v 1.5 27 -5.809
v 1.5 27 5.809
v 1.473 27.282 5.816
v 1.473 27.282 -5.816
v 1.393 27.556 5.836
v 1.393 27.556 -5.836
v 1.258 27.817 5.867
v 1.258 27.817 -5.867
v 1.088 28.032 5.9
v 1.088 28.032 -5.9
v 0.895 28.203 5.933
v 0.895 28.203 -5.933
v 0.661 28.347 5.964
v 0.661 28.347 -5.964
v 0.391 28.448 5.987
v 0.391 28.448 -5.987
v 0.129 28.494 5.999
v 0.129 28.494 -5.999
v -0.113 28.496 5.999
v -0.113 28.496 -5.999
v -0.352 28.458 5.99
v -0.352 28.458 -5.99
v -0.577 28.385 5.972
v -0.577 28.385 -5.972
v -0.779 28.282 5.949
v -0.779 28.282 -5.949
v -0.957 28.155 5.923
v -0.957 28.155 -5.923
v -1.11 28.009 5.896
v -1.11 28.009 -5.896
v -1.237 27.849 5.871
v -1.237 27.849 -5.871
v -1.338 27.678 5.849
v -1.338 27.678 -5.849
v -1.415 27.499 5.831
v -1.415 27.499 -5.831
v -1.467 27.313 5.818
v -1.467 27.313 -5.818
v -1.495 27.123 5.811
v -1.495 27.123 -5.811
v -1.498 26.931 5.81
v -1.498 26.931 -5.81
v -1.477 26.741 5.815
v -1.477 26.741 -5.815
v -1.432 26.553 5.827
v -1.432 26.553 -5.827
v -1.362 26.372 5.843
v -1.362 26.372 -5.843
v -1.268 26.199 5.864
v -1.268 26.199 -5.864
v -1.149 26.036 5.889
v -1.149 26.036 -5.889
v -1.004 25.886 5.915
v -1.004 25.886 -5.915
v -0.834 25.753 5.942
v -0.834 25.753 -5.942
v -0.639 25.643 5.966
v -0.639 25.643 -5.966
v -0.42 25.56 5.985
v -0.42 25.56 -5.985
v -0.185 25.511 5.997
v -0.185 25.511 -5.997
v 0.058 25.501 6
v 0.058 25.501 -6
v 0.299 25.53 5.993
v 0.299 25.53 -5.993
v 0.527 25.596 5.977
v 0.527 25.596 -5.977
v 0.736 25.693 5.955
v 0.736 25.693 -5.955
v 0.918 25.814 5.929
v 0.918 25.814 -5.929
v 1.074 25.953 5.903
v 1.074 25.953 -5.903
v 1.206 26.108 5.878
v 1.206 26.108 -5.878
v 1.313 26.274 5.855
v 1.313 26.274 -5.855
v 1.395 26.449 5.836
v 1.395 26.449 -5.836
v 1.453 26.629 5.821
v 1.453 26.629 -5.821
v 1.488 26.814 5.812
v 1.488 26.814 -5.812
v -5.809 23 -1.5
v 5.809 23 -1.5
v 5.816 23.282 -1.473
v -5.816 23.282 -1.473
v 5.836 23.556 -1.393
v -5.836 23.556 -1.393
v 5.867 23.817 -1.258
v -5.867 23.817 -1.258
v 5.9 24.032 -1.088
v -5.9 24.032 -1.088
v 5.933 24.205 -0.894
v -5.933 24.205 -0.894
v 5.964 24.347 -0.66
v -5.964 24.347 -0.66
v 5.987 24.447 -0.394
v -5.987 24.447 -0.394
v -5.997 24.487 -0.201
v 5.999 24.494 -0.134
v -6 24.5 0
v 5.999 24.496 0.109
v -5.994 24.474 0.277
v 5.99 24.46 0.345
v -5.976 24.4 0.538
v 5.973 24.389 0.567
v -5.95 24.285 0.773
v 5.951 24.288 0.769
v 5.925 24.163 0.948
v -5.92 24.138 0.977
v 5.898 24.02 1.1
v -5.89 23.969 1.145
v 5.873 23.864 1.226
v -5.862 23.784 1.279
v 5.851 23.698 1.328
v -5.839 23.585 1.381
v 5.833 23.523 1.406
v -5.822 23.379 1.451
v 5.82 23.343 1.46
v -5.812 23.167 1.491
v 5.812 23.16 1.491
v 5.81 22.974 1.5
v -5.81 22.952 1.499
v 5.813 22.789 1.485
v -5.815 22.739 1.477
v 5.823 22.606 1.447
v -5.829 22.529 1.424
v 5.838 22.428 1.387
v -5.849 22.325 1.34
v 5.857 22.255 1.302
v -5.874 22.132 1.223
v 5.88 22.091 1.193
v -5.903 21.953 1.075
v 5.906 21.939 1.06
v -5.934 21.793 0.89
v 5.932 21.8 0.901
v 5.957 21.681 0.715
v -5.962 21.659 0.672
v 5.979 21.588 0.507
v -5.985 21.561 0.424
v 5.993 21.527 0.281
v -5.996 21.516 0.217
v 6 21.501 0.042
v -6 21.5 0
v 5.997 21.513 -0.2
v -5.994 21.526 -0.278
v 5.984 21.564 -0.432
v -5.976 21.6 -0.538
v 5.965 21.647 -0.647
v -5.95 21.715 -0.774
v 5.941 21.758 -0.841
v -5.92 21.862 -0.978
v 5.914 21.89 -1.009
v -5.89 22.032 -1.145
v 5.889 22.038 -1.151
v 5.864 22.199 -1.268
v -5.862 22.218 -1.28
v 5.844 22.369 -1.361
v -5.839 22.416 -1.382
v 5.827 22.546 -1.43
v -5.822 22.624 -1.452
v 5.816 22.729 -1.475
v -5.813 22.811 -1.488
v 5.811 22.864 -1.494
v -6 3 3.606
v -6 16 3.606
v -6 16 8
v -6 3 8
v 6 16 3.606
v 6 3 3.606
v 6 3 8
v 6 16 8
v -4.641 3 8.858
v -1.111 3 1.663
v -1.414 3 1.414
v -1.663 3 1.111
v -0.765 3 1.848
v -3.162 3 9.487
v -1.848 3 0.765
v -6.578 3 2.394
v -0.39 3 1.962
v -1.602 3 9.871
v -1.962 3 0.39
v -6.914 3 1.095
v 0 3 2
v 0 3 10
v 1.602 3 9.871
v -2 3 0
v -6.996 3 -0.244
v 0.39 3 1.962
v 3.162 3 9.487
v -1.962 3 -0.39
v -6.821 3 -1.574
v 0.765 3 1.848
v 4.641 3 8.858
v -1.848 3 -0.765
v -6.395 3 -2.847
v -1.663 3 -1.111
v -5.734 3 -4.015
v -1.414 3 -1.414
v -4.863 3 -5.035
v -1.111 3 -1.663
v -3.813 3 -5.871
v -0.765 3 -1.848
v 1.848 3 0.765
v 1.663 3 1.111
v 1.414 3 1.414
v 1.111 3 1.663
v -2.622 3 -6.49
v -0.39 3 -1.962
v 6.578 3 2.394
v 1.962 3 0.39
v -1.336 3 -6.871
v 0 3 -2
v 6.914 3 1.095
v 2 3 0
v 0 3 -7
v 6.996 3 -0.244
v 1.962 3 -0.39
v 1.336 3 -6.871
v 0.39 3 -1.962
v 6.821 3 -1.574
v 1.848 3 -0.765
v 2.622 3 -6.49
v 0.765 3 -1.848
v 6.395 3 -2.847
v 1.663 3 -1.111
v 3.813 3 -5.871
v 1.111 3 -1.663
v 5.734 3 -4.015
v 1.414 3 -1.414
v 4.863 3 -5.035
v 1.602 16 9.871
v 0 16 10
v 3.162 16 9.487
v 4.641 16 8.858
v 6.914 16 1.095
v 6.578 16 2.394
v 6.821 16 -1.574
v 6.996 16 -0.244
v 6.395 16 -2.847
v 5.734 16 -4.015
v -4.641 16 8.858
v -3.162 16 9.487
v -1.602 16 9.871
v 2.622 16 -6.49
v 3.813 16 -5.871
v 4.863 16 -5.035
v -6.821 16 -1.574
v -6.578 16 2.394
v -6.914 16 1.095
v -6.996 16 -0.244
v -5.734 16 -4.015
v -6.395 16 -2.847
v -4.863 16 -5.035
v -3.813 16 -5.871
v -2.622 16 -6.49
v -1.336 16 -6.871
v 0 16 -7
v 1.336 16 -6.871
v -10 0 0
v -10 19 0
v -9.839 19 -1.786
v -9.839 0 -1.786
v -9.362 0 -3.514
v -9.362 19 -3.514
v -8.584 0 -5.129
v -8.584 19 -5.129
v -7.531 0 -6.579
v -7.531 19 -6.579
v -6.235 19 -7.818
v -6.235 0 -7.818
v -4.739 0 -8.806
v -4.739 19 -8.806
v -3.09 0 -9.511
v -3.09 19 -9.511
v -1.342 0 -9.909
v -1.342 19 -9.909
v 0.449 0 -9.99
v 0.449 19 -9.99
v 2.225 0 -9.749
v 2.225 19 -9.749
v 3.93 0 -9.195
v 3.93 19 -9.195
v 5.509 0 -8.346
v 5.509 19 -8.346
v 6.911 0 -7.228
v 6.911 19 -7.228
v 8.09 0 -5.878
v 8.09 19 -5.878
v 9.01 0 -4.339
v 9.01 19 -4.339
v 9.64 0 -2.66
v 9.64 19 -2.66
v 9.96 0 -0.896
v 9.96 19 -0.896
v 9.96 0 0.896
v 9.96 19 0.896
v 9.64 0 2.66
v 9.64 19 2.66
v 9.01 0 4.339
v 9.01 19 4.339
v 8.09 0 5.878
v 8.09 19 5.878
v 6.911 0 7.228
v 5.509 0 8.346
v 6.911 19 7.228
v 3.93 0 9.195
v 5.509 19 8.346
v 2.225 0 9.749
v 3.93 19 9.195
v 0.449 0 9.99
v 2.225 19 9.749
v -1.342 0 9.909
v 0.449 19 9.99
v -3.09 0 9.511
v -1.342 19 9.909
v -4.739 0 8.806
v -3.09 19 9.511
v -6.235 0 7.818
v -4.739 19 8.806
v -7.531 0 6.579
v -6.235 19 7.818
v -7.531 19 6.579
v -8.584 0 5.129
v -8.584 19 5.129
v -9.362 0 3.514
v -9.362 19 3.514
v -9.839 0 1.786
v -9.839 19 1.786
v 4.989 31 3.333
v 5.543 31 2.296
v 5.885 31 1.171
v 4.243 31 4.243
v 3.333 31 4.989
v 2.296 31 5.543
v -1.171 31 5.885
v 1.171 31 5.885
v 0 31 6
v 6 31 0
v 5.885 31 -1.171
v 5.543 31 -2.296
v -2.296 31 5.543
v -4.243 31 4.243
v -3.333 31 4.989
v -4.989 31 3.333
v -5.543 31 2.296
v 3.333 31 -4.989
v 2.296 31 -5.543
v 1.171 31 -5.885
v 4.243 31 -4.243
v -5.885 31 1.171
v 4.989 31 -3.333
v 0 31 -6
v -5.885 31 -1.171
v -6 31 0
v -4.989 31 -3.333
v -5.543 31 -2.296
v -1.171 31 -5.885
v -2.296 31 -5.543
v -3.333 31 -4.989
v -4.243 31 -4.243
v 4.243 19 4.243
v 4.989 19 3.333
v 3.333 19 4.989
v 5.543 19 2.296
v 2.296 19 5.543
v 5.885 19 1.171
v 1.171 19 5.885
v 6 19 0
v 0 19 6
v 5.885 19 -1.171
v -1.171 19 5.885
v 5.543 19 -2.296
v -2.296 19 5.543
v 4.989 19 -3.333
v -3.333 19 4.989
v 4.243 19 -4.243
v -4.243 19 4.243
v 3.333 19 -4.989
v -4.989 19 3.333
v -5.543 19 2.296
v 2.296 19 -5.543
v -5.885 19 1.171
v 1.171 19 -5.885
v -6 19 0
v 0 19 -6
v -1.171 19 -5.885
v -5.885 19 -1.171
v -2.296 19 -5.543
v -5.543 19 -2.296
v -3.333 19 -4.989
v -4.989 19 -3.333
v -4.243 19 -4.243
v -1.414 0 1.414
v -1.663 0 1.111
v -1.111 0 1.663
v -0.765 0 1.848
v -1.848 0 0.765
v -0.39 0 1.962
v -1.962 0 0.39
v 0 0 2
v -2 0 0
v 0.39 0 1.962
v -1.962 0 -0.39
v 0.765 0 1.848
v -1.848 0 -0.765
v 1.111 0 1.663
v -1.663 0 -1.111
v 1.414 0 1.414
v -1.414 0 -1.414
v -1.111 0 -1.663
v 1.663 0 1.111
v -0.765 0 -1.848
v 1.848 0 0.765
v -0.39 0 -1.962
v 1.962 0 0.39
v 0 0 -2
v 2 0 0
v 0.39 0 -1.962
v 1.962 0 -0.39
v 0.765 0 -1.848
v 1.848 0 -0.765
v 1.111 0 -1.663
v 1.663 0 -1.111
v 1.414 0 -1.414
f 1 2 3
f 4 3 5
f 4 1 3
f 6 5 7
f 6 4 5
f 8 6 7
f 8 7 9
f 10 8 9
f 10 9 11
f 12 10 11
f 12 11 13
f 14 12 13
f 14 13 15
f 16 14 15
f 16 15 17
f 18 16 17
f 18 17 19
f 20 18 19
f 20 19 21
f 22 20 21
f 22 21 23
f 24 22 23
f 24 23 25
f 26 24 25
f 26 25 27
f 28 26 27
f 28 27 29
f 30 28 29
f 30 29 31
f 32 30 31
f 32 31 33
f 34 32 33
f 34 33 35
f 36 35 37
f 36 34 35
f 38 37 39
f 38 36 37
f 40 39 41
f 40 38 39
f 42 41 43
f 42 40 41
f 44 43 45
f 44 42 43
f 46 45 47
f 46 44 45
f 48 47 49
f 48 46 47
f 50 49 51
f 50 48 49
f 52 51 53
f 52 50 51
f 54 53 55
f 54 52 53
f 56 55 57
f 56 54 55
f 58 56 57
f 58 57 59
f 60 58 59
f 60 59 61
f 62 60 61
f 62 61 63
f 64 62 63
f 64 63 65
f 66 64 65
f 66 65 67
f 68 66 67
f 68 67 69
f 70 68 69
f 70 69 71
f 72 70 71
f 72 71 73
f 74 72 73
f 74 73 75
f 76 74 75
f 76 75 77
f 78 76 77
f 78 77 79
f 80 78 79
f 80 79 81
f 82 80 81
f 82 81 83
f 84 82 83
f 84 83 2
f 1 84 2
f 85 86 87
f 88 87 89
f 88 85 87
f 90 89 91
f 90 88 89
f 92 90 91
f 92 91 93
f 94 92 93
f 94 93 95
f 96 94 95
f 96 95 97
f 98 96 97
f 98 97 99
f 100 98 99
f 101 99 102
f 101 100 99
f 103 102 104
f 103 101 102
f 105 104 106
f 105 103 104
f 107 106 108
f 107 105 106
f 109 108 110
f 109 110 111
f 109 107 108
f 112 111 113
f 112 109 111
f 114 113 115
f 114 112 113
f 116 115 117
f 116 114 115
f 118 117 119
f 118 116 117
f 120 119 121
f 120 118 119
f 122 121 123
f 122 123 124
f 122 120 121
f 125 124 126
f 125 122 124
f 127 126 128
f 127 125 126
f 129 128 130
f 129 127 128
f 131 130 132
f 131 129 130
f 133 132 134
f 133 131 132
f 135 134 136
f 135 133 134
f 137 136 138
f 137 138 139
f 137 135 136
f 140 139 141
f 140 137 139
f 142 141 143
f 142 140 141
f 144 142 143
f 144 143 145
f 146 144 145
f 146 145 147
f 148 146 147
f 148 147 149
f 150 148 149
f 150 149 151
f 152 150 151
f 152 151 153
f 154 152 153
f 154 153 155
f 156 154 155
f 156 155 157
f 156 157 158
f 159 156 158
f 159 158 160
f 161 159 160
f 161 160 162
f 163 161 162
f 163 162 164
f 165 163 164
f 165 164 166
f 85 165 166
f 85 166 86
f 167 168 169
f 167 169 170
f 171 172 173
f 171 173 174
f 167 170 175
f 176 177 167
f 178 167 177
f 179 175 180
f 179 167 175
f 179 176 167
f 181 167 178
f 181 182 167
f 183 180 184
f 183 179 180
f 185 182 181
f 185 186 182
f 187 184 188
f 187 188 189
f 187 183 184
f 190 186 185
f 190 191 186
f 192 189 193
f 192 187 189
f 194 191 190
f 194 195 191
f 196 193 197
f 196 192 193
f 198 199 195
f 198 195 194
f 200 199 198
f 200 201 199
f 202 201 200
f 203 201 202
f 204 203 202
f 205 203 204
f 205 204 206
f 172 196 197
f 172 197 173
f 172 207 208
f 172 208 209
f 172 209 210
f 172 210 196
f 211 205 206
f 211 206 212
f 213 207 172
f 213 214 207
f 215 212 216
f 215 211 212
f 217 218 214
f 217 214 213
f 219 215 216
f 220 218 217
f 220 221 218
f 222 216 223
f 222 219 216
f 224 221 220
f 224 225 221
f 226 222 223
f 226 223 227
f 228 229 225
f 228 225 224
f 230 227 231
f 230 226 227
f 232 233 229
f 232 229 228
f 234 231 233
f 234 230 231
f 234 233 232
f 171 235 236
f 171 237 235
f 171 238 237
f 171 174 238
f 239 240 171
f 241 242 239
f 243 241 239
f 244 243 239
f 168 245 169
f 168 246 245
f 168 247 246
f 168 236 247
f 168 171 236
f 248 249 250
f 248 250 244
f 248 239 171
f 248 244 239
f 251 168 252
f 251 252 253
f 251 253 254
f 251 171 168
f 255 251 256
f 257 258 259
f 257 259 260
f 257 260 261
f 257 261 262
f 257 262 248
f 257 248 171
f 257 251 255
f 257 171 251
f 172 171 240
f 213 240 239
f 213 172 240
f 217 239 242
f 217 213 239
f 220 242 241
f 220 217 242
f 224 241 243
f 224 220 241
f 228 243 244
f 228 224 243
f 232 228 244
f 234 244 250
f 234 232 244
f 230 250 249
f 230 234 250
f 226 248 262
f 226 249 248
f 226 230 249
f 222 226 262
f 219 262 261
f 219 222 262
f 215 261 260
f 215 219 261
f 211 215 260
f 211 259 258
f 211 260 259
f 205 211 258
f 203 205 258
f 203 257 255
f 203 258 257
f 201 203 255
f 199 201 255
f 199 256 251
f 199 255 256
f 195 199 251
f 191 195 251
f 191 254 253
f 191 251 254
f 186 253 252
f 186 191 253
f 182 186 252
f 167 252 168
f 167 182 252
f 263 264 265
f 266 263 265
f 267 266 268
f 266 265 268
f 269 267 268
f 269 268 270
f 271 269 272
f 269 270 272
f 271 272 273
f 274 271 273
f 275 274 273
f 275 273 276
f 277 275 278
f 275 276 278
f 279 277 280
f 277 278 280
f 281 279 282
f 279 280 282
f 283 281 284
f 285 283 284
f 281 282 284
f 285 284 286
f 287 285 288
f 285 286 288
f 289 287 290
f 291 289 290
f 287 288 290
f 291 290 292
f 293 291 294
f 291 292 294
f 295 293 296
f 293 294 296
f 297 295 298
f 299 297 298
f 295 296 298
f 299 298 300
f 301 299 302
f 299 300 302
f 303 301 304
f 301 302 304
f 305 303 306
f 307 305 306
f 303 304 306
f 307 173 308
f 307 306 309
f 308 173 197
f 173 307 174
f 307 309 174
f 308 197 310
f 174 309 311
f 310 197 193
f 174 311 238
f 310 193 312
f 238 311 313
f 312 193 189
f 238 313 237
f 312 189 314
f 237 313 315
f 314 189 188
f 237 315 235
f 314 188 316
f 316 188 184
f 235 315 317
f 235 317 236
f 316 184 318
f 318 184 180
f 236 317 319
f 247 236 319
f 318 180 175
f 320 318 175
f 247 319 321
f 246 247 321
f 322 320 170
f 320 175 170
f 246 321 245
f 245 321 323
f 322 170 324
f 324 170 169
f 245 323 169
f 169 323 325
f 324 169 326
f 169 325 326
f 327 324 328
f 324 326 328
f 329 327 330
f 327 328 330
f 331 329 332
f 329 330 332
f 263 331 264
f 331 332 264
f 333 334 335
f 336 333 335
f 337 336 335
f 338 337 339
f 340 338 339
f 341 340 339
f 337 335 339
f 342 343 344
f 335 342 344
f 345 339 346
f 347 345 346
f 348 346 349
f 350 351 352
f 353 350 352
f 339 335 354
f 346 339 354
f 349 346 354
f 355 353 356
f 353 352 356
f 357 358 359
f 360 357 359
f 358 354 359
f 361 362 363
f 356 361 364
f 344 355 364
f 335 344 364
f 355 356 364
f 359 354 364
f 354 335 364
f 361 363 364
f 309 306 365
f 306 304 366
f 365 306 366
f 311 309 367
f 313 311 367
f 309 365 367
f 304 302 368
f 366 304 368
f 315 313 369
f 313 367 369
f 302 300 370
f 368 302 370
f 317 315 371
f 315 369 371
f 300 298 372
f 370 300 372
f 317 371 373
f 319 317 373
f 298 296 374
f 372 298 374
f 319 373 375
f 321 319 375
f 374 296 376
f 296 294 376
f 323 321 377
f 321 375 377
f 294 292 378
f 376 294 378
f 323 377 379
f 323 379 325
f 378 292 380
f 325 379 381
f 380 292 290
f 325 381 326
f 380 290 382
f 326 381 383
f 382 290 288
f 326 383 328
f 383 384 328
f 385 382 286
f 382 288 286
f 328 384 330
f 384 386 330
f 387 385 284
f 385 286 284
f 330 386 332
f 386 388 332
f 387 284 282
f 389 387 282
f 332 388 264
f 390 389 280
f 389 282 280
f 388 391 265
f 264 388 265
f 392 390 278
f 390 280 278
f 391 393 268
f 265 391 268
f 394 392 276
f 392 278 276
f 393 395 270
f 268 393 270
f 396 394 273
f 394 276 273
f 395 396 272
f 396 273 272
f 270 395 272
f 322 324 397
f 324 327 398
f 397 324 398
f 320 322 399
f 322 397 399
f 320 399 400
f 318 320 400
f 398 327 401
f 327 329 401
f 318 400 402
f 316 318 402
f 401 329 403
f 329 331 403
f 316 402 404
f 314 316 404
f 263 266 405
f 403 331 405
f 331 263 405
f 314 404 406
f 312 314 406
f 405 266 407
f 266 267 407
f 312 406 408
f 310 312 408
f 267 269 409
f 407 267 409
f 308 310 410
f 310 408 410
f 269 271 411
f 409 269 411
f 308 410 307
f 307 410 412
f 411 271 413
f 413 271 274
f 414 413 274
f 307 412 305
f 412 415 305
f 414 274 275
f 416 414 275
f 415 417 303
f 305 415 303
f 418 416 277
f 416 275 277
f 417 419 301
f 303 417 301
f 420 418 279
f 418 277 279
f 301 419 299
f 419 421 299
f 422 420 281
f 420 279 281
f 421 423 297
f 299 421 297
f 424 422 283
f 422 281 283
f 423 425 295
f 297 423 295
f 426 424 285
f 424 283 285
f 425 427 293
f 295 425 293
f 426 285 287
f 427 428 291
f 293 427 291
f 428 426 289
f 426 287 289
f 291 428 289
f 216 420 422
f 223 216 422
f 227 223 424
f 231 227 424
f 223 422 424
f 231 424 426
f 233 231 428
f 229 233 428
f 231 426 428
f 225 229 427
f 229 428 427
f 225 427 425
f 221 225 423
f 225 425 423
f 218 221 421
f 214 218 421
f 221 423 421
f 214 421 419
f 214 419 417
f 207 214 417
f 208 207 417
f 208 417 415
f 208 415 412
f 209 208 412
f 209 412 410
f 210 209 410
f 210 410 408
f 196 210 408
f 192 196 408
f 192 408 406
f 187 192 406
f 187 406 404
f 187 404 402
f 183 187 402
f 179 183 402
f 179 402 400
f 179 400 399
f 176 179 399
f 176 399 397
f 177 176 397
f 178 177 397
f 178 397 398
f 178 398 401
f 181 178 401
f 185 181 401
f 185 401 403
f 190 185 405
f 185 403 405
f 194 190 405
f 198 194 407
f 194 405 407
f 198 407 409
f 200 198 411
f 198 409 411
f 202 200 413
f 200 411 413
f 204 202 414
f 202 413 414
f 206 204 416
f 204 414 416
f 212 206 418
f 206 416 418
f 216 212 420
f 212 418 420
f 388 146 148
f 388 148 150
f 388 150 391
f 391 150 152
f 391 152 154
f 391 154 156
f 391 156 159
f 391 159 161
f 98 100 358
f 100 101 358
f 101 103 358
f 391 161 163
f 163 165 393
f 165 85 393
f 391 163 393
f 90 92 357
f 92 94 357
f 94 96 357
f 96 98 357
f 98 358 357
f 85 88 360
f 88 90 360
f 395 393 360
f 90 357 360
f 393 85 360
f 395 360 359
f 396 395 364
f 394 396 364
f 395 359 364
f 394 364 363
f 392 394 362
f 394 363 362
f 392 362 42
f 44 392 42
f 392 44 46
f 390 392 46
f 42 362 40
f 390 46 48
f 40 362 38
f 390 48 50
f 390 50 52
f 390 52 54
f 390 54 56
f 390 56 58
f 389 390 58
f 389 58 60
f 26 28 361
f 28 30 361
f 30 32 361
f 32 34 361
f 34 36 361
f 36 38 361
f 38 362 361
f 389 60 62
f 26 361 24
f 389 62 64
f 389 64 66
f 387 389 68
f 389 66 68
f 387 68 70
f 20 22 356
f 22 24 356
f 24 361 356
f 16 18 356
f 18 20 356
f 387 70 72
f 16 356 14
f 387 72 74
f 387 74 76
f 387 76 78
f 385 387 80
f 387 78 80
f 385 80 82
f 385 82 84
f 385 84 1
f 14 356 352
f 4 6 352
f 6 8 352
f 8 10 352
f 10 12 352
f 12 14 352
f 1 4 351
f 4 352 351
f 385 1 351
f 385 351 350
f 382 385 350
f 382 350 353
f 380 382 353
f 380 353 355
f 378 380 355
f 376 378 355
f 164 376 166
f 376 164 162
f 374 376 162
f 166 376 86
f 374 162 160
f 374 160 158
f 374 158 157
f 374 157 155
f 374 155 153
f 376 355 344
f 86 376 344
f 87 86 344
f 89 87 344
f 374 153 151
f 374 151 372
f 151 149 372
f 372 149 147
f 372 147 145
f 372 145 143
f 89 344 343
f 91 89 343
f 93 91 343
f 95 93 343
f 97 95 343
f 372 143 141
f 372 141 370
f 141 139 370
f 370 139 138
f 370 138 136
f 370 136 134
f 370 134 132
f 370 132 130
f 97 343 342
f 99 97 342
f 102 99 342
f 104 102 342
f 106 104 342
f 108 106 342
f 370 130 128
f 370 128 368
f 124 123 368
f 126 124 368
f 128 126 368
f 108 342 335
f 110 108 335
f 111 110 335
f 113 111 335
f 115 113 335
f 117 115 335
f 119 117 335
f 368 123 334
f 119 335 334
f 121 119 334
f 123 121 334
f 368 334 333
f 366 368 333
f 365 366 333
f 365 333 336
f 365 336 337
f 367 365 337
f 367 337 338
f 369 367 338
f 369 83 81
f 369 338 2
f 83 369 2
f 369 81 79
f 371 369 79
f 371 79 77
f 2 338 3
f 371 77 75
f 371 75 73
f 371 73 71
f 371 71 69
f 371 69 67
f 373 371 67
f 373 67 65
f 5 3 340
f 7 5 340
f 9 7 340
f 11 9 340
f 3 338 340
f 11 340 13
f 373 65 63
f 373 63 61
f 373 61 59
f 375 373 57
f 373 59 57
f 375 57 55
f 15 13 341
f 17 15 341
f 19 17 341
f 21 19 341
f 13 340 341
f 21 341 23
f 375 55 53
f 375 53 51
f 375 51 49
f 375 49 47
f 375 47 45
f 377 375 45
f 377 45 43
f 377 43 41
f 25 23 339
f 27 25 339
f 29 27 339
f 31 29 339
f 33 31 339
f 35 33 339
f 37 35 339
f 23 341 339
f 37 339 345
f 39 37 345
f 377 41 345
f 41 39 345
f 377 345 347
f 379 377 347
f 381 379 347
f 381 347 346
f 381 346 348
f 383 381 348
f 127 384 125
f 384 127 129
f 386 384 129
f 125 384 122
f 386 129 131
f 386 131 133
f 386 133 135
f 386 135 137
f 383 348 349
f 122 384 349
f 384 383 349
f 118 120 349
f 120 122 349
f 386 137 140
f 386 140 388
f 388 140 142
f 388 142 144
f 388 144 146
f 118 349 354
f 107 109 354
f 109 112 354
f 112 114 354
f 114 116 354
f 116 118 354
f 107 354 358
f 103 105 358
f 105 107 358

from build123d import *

# Parameters (mm, degrees)
SKETCH_2_R               = 7
CUT_EXTRUDE_1_DEPTH      = 13
CUT_EXTRUDE_2_DEPTH      = 18
CUT_EXTRUDE_3_DEPTH      = 35.073450075
CUT_EXTRUDE_3_DEPTH_BACK = 35.073450075
SKETCH_4_R               = 1.5
SKETCH_5_R               = 2
CUT_EXTRUDE_4_DEPTH      = 4
CUT_EXTRUDE_5_DEPTH      = 35.073450166
CUT_EXTRUDE_5_DEPTH_BACK = 35.073450166
SKETCH_6_R               = 1.5


with BuildPart() as part:
    # 草图1 → 旋转1 (revolve)
    with BuildSketch(Plane.XY, mode=Mode.PRIVATE) as revolve_1_sk:
        Polygon((0, 0), (10, 0), (10, 19), (6, 19), (6, 31), (0, 31), align=None)
    revolve(revolve_1_sk.sketch.rotate(Axis((0, 31, 0), (0, -1, 0)), 180), axis=Axis((0, 31, 0), (0, -1, 0)))

    # 草图2 → 切除-拉伸1 (cut)
    with BuildSketch(Plane(origin=(0, 3, 0), x_dir=(1, 0, 0), z_dir=(0, 1, 0))):
        with Locations(Location((0, 0, 0), (0, 0, 90))):
            Circle(SKETCH_2_R)
    extrude(amount=CUT_EXTRUDE_1_DEPTH, mode=Mode.SUBTRACT)

    # 草图3 → 切除-拉伸2 (cut)
    with BuildSketch(Plane.XY):
        Polygon((0, 3), (6, 3), (6, 16), (-6, 16), (-6, 3), align=None)
    extrude(amount=CUT_EXTRUDE_2_DEPTH, mode=Mode.SUBTRACT)

    # 草图4 → 切除-拉伸3 (cut, two sides: drawn at the far end of the back side and taken through both)
    with BuildSketch(Plane.XY.offset(-CUT_EXTRUDE_3_DEPTH_BACK)):
        with Locations((0, 27)):
            Circle(SKETCH_4_R)
    extrude(amount=CUT_EXTRUDE_3_DEPTH + CUT_EXTRUDE_3_DEPTH_BACK, mode=Mode.SUBTRACT)

    # 草图5 → 切除-拉伸4 (cut)
    with BuildSketch(Plane.XZ):
        with Locations(Location((0, 0, 0), (0, 0, 270))):
            Circle(SKETCH_5_R)
    extrude(amount=-CUT_EXTRUDE_4_DEPTH, mode=Mode.SUBTRACT)

    # 草图6 → 切除-拉伸5 (cut, two sides: drawn at the far end of the back side and taken through both)
    with BuildSketch(Plane(origin=(0, 0, 0), x_dir=(0, 0, -1), z_dir=(1, 0, 0)).offset(-CUT_EXTRUDE_5_DEPTH_BACK)):
        with Locations((0, 23)):
            Circle(SKETCH_6_R)
    extrude(amount=CUT_EXTRUDE_5_DEPTH + CUT_EXTRUDE_5_DEPTH_BACK, mode=Mode.SUBTRACT)


solid = part.part
